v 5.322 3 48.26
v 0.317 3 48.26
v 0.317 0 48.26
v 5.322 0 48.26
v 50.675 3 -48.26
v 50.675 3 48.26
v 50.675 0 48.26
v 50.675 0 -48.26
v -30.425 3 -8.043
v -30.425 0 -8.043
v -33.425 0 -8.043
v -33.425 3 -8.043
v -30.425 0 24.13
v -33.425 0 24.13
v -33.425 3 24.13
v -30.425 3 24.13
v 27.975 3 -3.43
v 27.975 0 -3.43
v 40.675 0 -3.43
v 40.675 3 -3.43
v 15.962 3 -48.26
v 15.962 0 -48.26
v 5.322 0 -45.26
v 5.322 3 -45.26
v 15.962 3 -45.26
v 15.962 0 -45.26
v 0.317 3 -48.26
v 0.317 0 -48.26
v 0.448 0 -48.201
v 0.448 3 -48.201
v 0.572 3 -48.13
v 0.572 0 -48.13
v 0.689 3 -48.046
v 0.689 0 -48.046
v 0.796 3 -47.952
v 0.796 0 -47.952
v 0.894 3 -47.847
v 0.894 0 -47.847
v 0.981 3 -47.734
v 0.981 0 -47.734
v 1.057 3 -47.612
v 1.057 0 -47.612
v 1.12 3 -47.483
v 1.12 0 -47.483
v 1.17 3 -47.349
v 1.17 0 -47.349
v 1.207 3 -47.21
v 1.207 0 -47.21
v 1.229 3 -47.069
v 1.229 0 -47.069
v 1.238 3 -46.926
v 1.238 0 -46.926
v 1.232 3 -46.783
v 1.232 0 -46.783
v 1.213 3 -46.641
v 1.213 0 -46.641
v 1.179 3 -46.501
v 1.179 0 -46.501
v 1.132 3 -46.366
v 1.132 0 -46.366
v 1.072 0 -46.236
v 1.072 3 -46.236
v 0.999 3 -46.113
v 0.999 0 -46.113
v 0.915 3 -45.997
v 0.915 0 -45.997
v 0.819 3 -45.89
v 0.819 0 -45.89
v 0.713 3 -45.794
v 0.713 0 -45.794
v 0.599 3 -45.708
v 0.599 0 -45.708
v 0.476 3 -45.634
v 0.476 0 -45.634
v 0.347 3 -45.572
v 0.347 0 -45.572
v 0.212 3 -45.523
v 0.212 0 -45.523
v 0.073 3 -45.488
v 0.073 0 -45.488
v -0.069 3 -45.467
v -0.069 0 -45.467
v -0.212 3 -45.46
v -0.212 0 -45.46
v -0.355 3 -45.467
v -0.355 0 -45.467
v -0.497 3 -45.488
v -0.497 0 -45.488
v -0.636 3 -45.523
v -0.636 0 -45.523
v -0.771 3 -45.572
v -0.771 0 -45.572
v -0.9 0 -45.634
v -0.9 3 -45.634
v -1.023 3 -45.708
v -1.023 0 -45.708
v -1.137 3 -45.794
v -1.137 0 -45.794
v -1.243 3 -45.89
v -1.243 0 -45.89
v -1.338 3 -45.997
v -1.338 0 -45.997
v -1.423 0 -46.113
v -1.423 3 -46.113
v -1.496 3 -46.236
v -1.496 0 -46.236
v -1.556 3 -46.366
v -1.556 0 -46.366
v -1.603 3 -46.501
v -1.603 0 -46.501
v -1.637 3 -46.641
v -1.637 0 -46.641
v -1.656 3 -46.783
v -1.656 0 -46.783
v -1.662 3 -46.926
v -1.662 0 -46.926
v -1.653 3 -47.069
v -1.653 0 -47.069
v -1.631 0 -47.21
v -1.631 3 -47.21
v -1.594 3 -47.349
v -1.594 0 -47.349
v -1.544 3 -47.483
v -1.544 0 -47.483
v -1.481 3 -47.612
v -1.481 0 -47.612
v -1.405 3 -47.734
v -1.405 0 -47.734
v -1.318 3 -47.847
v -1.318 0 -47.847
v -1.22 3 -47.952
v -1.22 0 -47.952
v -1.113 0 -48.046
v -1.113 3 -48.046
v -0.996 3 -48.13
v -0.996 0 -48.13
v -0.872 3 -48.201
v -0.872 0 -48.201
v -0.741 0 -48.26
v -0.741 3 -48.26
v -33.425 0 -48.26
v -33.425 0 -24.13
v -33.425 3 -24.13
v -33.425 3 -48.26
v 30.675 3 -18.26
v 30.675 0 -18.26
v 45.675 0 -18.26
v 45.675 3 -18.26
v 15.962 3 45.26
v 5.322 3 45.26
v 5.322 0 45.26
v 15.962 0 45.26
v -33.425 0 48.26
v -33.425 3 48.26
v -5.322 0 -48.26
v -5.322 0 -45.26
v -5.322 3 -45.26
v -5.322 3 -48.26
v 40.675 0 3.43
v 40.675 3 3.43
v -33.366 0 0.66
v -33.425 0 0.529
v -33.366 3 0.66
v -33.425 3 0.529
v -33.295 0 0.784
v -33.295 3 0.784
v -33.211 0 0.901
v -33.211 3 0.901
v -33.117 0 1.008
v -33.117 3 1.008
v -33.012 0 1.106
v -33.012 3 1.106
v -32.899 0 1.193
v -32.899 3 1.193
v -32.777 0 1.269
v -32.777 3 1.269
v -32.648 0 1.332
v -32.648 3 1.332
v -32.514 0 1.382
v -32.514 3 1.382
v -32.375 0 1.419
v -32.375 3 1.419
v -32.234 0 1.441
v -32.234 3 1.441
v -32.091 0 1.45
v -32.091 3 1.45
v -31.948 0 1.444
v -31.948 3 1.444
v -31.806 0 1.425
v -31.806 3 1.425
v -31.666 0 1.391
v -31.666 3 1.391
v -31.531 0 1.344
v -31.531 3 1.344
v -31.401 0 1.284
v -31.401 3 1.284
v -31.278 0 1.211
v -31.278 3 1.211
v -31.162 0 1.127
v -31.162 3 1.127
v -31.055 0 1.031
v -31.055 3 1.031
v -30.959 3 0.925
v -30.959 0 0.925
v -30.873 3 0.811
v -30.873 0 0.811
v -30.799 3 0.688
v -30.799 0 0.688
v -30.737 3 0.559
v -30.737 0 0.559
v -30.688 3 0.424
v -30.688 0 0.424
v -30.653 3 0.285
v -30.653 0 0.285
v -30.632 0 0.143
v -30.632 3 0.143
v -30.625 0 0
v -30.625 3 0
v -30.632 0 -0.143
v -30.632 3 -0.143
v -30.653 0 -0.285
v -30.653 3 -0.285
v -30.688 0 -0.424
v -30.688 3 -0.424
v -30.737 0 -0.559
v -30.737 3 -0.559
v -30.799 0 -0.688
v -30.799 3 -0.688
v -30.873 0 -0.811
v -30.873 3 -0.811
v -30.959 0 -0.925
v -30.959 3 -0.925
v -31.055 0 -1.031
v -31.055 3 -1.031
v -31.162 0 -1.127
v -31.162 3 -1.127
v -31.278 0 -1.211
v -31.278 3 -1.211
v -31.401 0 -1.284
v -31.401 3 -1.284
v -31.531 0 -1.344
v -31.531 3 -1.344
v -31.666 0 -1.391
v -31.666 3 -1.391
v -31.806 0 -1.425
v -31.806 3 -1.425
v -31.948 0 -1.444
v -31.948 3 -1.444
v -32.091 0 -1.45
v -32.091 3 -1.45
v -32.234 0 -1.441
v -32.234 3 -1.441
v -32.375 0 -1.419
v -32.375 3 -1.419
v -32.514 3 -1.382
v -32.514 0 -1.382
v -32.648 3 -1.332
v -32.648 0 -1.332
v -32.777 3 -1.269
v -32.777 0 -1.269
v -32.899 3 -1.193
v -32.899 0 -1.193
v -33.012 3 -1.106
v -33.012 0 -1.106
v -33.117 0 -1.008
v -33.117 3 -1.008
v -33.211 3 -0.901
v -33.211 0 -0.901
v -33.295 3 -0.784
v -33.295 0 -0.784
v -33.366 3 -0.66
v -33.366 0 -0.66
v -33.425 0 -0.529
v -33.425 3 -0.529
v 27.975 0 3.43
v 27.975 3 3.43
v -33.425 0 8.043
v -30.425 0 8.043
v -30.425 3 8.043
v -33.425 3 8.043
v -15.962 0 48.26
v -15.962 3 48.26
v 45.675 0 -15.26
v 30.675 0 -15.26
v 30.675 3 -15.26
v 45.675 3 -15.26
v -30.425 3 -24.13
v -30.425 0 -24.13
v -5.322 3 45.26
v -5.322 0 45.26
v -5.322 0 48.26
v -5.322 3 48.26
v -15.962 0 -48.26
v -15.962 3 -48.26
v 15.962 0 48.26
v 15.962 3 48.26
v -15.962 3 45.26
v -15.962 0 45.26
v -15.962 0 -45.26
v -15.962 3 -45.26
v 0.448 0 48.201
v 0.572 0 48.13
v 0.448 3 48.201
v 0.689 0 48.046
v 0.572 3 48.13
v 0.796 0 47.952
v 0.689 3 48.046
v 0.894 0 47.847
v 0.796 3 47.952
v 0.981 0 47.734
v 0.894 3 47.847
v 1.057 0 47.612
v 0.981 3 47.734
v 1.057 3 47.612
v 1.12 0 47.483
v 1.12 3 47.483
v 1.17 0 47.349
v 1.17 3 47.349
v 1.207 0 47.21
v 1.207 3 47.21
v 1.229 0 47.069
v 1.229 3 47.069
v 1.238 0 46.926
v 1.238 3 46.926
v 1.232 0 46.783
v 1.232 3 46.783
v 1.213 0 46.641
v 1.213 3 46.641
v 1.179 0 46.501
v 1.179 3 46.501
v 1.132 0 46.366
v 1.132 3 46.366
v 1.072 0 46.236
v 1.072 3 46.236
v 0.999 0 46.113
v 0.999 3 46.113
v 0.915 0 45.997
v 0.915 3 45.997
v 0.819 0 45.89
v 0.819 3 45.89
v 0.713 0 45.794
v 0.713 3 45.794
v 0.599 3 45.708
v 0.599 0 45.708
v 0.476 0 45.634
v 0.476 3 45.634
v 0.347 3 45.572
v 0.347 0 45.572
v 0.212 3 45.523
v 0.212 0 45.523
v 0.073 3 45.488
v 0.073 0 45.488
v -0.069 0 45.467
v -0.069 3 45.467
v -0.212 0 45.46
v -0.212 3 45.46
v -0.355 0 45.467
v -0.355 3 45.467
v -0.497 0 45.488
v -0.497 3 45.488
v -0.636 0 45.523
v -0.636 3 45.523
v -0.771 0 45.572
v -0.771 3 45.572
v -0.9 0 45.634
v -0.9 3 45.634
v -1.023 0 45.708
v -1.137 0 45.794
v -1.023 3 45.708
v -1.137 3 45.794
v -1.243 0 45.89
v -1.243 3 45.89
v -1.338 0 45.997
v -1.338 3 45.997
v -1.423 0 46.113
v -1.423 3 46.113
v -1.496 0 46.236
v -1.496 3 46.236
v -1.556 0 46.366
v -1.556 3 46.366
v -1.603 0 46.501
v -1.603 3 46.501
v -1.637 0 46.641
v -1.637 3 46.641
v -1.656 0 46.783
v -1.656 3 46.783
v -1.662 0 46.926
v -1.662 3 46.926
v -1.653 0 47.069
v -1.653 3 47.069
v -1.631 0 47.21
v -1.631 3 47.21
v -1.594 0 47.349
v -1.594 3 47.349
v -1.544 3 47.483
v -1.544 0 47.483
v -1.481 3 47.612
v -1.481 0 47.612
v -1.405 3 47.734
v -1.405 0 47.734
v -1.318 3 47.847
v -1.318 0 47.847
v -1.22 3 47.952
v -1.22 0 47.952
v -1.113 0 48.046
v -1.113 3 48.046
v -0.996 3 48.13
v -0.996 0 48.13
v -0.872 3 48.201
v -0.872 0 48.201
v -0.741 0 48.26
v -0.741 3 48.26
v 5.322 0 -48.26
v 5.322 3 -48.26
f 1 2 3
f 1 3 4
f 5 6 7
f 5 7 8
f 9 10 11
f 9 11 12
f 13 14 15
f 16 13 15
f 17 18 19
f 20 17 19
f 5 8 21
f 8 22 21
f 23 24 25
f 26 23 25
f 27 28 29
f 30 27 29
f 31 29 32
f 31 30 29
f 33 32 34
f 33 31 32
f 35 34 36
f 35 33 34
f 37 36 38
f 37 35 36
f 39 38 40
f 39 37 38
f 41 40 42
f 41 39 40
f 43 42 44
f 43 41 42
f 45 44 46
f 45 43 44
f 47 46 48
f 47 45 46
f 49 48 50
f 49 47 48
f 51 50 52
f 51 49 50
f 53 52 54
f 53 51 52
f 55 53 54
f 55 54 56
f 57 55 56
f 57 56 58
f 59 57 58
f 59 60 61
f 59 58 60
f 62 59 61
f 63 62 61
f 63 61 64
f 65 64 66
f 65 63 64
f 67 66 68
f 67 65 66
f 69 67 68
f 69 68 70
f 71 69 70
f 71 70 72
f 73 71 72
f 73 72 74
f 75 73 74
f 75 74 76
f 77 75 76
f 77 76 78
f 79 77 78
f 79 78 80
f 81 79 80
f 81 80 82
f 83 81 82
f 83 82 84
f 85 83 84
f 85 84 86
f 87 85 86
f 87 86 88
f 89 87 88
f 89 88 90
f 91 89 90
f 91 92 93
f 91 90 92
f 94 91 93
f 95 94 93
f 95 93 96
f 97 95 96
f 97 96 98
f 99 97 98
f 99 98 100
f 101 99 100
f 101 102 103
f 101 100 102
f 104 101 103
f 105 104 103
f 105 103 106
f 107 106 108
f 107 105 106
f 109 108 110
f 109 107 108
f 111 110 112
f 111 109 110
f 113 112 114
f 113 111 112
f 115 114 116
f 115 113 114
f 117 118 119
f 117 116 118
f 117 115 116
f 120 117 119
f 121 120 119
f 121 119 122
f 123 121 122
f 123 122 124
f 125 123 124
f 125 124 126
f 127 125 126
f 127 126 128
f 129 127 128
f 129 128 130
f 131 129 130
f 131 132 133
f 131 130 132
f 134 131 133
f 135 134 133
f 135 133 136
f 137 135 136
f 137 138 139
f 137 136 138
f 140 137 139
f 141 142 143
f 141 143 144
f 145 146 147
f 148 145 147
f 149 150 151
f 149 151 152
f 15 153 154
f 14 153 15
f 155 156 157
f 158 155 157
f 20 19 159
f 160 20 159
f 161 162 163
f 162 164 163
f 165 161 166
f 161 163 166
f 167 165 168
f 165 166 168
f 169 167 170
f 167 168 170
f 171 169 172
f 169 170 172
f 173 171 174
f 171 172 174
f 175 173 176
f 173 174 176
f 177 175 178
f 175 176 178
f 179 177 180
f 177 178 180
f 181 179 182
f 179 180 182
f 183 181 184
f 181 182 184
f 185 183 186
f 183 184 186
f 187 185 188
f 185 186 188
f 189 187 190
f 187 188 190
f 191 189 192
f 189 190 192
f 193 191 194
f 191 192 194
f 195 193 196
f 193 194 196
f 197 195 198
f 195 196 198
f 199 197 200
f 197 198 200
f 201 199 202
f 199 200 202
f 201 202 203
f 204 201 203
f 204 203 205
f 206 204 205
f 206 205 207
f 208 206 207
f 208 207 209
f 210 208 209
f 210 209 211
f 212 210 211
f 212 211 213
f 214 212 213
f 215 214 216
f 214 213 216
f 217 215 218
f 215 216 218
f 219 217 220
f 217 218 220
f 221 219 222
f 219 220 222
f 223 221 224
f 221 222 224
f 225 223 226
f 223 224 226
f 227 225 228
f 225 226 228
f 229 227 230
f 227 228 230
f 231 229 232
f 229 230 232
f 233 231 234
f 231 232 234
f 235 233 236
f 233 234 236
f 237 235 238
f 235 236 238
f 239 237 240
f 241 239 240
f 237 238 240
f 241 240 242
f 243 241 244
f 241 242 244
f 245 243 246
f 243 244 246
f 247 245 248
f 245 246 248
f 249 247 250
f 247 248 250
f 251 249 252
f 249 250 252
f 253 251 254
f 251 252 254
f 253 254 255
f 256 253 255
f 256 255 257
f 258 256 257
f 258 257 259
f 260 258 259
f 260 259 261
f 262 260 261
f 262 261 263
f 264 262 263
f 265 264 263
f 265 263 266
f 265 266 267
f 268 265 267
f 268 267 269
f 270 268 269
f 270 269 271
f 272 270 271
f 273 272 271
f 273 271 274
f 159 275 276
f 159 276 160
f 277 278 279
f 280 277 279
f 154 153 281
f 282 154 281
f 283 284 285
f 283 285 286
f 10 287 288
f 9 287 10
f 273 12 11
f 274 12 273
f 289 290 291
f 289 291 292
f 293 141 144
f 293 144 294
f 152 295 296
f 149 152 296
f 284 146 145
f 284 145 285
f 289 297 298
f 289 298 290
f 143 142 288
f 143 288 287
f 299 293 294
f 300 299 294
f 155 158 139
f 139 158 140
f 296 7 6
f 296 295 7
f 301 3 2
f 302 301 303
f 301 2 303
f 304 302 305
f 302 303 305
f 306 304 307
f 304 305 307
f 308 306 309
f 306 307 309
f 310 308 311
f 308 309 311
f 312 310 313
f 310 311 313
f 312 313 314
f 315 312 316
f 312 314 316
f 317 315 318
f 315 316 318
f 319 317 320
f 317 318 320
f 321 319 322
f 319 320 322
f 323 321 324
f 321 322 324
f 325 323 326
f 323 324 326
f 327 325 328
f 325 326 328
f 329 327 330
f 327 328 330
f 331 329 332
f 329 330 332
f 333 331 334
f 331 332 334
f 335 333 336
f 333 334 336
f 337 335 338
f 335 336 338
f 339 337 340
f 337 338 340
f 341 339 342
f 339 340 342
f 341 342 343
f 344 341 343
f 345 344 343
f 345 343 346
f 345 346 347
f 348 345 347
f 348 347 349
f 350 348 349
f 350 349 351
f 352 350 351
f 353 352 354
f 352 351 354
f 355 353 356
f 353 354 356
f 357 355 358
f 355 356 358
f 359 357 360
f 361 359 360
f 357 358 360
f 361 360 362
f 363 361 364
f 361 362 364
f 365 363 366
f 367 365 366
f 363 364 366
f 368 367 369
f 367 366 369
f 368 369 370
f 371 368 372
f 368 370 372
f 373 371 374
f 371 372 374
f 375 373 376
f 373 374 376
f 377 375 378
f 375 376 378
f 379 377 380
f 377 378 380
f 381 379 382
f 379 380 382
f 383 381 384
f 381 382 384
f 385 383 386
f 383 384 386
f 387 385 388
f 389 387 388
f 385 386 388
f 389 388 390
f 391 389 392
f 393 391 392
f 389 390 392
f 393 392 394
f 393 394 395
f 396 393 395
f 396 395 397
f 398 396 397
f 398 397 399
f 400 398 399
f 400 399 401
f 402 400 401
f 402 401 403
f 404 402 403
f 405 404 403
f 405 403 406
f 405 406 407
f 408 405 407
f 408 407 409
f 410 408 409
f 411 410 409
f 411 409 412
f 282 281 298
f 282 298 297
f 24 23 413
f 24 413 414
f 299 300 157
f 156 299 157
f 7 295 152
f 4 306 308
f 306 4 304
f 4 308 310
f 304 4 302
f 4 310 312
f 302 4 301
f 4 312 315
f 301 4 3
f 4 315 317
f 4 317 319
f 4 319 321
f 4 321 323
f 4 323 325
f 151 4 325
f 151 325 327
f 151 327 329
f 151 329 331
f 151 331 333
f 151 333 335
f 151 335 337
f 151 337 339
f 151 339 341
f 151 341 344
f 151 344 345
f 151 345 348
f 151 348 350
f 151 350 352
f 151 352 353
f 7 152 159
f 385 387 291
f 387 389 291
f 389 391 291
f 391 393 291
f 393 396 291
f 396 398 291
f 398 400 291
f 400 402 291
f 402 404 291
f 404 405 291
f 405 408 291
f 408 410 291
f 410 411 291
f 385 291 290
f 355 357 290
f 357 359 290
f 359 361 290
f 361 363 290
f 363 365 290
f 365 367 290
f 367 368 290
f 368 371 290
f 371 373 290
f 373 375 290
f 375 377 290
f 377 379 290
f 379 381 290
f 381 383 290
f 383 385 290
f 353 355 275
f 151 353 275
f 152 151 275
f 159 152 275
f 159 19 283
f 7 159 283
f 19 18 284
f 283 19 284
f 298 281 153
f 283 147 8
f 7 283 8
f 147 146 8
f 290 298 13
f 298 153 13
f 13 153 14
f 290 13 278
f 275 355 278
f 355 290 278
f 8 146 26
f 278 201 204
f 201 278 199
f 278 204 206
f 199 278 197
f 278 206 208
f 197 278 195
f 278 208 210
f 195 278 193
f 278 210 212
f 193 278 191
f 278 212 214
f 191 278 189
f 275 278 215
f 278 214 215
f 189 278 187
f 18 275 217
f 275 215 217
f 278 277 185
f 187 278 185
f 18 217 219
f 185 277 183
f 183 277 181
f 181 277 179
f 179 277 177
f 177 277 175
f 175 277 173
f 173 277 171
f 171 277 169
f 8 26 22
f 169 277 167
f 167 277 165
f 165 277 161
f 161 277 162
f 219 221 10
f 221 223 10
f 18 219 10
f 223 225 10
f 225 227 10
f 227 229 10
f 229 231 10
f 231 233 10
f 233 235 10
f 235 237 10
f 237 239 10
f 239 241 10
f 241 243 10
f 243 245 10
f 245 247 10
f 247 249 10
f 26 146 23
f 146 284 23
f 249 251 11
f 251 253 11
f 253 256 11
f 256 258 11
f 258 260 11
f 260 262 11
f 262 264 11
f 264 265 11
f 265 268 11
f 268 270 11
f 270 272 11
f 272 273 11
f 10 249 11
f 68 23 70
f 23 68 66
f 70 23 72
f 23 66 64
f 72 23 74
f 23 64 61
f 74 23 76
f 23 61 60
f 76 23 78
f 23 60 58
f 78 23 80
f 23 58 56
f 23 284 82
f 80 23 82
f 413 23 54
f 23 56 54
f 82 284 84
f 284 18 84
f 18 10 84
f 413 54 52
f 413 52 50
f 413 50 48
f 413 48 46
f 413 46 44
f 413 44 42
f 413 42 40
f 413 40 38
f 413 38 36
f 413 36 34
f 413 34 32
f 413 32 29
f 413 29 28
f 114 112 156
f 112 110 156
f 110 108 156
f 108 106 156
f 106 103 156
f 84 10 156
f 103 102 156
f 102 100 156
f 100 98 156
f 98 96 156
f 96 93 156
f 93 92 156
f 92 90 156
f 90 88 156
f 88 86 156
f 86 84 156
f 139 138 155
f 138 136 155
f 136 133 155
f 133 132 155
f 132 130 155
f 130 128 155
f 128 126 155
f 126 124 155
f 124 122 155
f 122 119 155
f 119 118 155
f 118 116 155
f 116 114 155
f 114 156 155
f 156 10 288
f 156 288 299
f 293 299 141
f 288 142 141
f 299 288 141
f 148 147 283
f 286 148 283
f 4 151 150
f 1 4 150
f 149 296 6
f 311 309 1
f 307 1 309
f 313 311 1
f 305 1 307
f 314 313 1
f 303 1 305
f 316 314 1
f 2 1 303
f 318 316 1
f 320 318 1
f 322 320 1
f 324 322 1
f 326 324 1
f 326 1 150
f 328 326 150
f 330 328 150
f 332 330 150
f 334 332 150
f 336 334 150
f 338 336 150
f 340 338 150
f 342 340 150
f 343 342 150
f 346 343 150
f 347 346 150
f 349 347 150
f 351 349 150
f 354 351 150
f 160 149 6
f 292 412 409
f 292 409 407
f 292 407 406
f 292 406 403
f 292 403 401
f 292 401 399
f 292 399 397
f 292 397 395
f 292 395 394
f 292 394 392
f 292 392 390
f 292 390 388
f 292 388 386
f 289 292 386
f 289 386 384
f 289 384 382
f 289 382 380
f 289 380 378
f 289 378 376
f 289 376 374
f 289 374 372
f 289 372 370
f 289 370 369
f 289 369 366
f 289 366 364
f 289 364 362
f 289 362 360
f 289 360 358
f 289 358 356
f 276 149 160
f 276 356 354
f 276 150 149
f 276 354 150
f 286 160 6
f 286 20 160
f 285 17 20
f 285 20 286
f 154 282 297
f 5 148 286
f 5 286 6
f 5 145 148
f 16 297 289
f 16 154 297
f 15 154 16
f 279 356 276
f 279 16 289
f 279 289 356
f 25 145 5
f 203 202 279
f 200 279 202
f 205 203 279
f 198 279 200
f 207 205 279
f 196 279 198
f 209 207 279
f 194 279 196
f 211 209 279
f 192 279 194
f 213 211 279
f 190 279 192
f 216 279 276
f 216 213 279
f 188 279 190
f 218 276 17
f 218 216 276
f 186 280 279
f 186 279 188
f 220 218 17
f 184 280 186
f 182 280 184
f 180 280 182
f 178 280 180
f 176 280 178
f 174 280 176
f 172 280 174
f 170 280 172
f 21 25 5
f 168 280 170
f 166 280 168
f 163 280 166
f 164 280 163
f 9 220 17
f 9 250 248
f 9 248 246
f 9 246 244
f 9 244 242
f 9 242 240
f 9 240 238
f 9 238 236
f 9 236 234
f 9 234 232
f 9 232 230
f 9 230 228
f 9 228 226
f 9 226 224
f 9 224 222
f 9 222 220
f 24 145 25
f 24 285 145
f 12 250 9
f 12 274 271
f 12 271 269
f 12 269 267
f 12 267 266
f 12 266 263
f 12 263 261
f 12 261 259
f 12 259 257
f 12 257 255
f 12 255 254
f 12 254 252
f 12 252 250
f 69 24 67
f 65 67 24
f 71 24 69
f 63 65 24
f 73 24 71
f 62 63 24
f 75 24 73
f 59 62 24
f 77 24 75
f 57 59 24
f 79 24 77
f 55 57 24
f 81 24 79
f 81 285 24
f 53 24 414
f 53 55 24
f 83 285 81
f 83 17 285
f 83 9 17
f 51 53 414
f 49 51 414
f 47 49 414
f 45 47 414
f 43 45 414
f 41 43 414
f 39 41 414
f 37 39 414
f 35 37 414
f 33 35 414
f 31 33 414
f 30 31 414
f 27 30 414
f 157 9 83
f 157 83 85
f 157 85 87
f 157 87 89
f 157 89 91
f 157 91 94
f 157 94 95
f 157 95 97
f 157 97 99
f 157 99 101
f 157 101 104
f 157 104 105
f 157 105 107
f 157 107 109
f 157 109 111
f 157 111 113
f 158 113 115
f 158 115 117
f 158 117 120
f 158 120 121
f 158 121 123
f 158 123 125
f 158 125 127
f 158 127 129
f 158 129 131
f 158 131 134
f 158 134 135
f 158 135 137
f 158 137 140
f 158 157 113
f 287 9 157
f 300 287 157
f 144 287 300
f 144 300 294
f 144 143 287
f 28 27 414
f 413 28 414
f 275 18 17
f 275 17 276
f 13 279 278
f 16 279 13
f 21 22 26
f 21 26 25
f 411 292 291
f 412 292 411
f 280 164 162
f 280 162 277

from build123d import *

# Parameters (mm, degrees)
SKETCH1_W           = 66.85
SKETCH1_H           = 96.52
BOSS_EXTRUDE2_DEPTH = 3
SKETCH2_W           = 31.925
SKETCH2_H           = 3
CUT_EXTRUDE1_DEPTH  = 3
SKETCH3_W           = 48.26
SKETCH3_H           = 3
CUT_EXTRUDE2_DEPTH  = 3
SKETCH4_W           = 10.643333334
SKETCH4_H           = 3
BOSS_EXTRUDE3_DEPTH = 3
SKETCH5_W           = 16.086666666
SKETCH5_H           = 3
BOSS_EXTRUDE4_DEPTH = 3
SKETCH6_R           = 1.45
CUT_EXTRUDE10_DEPTH = 3
SKETCH7_R           = 1.45
CUT_EXTRUDE11_DEPTH = 3
SKETCH9_W           = 96.52
SKETCH9_H           = 3
BOSS_EXTRUDE5_DEPTH = 17.25
SKETCH10_W          = 12.7
SKETCH10_H          = 6.86
CUT_EXTRUDE12_DEPTH = 3
SKETCH12_W          = 15
SKETCH12_H          = 3
CUT_EXTRUDE14_DEPTH = 3


with BuildPart() as part:
    # Sketch1 → Boss-Extrude2 (new body)
    with BuildSketch(Plane(origin=(0, 0, 0), x_dir=(1, 0, 0), z_dir=(0, 1, 0))):
        Rectangle(SKETCH1_W, SKETCH1_H)
    extrude(amount=BOSS_EXTRUDE2_DEPTH)

    # Sketch2 → Cut-Extrude1 (cut)
    with BuildSketch(Plane.XY.offset(48.26)):
        with Locations((0, 1.5)):
            Rectangle(SKETCH2_W, SKETCH2_H)
    cut_extrude1 = extrude(amount=-CUT_EXTRUDE1_DEPTH, mode=Mode.SUBTRACT)

    # Mirror1: Cut-Extrude1 across plane
    add(cut_extrude1.mirror(Plane.XY), mode=Mode.SUBTRACT)

    # Sketch3 → Cut-Extrude2 (cut)
    with BuildSketch(Plane.ZY.offset(33.425)):
        with Locations((0, 1.5)):
            Rectangle(SKETCH3_W, SKETCH3_H)
    extrude(amount=-CUT_EXTRUDE2_DEPTH, mode=Mode.SUBTRACT)

    # Sketch4 → Boss-Extrude3 (add)
    with BuildSketch(Plane.XY.offset(45.26)):
        with Locations((0, 1.5)):
            Rectangle(SKETCH4_W, SKETCH4_H)
    boss_extrude3 = extrude(amount=BOSS_EXTRUDE3_DEPTH)

    # Mirror2: Boss-Extrude3 across plane
    add(boss_extrude3.mirror(Plane.XY))

    # Sketch5 → Boss-Extrude4 (add)
    with BuildSketch(Plane.ZY.offset(30.425)):
        with Locations((0, 1.5)):
            Rectangle(SKETCH5_W, SKETCH5_H)
    extrude(amount=BOSS_EXTRUDE4_DEPTH)

    # Sketch6 → Cut-Extrude10 (cut)
    with BuildSketch(Plane(origin=(0, 3, 0), x_dir=(1, 0, 0), z_dir=(0, 1, 0))):
        with Locations((-32.075, 0)):
            Circle(SKETCH6_R)
    extrude(amount=-CUT_EXTRUDE10_DEPTH, mode=Mode.SUBTRACT)

    # Sketch7 → Cut-Extrude11 (cut)
    with BuildSketch(Plane(origin=(0, 3, 0), x_dir=(1, 0, 0), z_dir=(0, 1, 0))):
        with Locations((-0.211991592, -46.91)):
            Circle(SKETCH7_R)
    cut_extrude11 = extrude(amount=-CUT_EXTRUDE11_DEPTH, mode=Mode.SUBTRACT)

    # Mirror3: Cut-Extrude11 across plane
    add(cut_extrude11.mirror(Plane.XY), mode=Mode.SUBTRACT)

    # Sketch9 → Boss-Extrude5 (add)
    with BuildSketch(Plane(origin=(33.425, 0, 0), x_dir=(0, 0, -1), z_dir=(1, 0, 0))):
        with Locations((0, 1.5)):
            Rectangle(SKETCH9_W, SKETCH9_H)
    extrude(amount=BOSS_EXTRUDE5_DEPTH)

    # Sketch10 → Cut-Extrude12 (cut)
    with BuildSketch(Plane.XZ):
        with Locations((34.325, 0)):
            Rectangle(SKETCH10_W, SKETCH10_H)
    extrude(amount=-CUT_EXTRUDE12_DEPTH, mode=Mode.SUBTRACT)

    # Sketch12 → Cut-Extrude14 (cut)
    with BuildSketch(Plane.XZ):
        with Locations((38.175, -16.76)):
            Rectangle(SKETCH12_W, SKETCH12_H)
    extrude(amount=-CUT_EXTRUDE14_DEPTH, mode=Mode.SUBTRACT)


solid = part.part
